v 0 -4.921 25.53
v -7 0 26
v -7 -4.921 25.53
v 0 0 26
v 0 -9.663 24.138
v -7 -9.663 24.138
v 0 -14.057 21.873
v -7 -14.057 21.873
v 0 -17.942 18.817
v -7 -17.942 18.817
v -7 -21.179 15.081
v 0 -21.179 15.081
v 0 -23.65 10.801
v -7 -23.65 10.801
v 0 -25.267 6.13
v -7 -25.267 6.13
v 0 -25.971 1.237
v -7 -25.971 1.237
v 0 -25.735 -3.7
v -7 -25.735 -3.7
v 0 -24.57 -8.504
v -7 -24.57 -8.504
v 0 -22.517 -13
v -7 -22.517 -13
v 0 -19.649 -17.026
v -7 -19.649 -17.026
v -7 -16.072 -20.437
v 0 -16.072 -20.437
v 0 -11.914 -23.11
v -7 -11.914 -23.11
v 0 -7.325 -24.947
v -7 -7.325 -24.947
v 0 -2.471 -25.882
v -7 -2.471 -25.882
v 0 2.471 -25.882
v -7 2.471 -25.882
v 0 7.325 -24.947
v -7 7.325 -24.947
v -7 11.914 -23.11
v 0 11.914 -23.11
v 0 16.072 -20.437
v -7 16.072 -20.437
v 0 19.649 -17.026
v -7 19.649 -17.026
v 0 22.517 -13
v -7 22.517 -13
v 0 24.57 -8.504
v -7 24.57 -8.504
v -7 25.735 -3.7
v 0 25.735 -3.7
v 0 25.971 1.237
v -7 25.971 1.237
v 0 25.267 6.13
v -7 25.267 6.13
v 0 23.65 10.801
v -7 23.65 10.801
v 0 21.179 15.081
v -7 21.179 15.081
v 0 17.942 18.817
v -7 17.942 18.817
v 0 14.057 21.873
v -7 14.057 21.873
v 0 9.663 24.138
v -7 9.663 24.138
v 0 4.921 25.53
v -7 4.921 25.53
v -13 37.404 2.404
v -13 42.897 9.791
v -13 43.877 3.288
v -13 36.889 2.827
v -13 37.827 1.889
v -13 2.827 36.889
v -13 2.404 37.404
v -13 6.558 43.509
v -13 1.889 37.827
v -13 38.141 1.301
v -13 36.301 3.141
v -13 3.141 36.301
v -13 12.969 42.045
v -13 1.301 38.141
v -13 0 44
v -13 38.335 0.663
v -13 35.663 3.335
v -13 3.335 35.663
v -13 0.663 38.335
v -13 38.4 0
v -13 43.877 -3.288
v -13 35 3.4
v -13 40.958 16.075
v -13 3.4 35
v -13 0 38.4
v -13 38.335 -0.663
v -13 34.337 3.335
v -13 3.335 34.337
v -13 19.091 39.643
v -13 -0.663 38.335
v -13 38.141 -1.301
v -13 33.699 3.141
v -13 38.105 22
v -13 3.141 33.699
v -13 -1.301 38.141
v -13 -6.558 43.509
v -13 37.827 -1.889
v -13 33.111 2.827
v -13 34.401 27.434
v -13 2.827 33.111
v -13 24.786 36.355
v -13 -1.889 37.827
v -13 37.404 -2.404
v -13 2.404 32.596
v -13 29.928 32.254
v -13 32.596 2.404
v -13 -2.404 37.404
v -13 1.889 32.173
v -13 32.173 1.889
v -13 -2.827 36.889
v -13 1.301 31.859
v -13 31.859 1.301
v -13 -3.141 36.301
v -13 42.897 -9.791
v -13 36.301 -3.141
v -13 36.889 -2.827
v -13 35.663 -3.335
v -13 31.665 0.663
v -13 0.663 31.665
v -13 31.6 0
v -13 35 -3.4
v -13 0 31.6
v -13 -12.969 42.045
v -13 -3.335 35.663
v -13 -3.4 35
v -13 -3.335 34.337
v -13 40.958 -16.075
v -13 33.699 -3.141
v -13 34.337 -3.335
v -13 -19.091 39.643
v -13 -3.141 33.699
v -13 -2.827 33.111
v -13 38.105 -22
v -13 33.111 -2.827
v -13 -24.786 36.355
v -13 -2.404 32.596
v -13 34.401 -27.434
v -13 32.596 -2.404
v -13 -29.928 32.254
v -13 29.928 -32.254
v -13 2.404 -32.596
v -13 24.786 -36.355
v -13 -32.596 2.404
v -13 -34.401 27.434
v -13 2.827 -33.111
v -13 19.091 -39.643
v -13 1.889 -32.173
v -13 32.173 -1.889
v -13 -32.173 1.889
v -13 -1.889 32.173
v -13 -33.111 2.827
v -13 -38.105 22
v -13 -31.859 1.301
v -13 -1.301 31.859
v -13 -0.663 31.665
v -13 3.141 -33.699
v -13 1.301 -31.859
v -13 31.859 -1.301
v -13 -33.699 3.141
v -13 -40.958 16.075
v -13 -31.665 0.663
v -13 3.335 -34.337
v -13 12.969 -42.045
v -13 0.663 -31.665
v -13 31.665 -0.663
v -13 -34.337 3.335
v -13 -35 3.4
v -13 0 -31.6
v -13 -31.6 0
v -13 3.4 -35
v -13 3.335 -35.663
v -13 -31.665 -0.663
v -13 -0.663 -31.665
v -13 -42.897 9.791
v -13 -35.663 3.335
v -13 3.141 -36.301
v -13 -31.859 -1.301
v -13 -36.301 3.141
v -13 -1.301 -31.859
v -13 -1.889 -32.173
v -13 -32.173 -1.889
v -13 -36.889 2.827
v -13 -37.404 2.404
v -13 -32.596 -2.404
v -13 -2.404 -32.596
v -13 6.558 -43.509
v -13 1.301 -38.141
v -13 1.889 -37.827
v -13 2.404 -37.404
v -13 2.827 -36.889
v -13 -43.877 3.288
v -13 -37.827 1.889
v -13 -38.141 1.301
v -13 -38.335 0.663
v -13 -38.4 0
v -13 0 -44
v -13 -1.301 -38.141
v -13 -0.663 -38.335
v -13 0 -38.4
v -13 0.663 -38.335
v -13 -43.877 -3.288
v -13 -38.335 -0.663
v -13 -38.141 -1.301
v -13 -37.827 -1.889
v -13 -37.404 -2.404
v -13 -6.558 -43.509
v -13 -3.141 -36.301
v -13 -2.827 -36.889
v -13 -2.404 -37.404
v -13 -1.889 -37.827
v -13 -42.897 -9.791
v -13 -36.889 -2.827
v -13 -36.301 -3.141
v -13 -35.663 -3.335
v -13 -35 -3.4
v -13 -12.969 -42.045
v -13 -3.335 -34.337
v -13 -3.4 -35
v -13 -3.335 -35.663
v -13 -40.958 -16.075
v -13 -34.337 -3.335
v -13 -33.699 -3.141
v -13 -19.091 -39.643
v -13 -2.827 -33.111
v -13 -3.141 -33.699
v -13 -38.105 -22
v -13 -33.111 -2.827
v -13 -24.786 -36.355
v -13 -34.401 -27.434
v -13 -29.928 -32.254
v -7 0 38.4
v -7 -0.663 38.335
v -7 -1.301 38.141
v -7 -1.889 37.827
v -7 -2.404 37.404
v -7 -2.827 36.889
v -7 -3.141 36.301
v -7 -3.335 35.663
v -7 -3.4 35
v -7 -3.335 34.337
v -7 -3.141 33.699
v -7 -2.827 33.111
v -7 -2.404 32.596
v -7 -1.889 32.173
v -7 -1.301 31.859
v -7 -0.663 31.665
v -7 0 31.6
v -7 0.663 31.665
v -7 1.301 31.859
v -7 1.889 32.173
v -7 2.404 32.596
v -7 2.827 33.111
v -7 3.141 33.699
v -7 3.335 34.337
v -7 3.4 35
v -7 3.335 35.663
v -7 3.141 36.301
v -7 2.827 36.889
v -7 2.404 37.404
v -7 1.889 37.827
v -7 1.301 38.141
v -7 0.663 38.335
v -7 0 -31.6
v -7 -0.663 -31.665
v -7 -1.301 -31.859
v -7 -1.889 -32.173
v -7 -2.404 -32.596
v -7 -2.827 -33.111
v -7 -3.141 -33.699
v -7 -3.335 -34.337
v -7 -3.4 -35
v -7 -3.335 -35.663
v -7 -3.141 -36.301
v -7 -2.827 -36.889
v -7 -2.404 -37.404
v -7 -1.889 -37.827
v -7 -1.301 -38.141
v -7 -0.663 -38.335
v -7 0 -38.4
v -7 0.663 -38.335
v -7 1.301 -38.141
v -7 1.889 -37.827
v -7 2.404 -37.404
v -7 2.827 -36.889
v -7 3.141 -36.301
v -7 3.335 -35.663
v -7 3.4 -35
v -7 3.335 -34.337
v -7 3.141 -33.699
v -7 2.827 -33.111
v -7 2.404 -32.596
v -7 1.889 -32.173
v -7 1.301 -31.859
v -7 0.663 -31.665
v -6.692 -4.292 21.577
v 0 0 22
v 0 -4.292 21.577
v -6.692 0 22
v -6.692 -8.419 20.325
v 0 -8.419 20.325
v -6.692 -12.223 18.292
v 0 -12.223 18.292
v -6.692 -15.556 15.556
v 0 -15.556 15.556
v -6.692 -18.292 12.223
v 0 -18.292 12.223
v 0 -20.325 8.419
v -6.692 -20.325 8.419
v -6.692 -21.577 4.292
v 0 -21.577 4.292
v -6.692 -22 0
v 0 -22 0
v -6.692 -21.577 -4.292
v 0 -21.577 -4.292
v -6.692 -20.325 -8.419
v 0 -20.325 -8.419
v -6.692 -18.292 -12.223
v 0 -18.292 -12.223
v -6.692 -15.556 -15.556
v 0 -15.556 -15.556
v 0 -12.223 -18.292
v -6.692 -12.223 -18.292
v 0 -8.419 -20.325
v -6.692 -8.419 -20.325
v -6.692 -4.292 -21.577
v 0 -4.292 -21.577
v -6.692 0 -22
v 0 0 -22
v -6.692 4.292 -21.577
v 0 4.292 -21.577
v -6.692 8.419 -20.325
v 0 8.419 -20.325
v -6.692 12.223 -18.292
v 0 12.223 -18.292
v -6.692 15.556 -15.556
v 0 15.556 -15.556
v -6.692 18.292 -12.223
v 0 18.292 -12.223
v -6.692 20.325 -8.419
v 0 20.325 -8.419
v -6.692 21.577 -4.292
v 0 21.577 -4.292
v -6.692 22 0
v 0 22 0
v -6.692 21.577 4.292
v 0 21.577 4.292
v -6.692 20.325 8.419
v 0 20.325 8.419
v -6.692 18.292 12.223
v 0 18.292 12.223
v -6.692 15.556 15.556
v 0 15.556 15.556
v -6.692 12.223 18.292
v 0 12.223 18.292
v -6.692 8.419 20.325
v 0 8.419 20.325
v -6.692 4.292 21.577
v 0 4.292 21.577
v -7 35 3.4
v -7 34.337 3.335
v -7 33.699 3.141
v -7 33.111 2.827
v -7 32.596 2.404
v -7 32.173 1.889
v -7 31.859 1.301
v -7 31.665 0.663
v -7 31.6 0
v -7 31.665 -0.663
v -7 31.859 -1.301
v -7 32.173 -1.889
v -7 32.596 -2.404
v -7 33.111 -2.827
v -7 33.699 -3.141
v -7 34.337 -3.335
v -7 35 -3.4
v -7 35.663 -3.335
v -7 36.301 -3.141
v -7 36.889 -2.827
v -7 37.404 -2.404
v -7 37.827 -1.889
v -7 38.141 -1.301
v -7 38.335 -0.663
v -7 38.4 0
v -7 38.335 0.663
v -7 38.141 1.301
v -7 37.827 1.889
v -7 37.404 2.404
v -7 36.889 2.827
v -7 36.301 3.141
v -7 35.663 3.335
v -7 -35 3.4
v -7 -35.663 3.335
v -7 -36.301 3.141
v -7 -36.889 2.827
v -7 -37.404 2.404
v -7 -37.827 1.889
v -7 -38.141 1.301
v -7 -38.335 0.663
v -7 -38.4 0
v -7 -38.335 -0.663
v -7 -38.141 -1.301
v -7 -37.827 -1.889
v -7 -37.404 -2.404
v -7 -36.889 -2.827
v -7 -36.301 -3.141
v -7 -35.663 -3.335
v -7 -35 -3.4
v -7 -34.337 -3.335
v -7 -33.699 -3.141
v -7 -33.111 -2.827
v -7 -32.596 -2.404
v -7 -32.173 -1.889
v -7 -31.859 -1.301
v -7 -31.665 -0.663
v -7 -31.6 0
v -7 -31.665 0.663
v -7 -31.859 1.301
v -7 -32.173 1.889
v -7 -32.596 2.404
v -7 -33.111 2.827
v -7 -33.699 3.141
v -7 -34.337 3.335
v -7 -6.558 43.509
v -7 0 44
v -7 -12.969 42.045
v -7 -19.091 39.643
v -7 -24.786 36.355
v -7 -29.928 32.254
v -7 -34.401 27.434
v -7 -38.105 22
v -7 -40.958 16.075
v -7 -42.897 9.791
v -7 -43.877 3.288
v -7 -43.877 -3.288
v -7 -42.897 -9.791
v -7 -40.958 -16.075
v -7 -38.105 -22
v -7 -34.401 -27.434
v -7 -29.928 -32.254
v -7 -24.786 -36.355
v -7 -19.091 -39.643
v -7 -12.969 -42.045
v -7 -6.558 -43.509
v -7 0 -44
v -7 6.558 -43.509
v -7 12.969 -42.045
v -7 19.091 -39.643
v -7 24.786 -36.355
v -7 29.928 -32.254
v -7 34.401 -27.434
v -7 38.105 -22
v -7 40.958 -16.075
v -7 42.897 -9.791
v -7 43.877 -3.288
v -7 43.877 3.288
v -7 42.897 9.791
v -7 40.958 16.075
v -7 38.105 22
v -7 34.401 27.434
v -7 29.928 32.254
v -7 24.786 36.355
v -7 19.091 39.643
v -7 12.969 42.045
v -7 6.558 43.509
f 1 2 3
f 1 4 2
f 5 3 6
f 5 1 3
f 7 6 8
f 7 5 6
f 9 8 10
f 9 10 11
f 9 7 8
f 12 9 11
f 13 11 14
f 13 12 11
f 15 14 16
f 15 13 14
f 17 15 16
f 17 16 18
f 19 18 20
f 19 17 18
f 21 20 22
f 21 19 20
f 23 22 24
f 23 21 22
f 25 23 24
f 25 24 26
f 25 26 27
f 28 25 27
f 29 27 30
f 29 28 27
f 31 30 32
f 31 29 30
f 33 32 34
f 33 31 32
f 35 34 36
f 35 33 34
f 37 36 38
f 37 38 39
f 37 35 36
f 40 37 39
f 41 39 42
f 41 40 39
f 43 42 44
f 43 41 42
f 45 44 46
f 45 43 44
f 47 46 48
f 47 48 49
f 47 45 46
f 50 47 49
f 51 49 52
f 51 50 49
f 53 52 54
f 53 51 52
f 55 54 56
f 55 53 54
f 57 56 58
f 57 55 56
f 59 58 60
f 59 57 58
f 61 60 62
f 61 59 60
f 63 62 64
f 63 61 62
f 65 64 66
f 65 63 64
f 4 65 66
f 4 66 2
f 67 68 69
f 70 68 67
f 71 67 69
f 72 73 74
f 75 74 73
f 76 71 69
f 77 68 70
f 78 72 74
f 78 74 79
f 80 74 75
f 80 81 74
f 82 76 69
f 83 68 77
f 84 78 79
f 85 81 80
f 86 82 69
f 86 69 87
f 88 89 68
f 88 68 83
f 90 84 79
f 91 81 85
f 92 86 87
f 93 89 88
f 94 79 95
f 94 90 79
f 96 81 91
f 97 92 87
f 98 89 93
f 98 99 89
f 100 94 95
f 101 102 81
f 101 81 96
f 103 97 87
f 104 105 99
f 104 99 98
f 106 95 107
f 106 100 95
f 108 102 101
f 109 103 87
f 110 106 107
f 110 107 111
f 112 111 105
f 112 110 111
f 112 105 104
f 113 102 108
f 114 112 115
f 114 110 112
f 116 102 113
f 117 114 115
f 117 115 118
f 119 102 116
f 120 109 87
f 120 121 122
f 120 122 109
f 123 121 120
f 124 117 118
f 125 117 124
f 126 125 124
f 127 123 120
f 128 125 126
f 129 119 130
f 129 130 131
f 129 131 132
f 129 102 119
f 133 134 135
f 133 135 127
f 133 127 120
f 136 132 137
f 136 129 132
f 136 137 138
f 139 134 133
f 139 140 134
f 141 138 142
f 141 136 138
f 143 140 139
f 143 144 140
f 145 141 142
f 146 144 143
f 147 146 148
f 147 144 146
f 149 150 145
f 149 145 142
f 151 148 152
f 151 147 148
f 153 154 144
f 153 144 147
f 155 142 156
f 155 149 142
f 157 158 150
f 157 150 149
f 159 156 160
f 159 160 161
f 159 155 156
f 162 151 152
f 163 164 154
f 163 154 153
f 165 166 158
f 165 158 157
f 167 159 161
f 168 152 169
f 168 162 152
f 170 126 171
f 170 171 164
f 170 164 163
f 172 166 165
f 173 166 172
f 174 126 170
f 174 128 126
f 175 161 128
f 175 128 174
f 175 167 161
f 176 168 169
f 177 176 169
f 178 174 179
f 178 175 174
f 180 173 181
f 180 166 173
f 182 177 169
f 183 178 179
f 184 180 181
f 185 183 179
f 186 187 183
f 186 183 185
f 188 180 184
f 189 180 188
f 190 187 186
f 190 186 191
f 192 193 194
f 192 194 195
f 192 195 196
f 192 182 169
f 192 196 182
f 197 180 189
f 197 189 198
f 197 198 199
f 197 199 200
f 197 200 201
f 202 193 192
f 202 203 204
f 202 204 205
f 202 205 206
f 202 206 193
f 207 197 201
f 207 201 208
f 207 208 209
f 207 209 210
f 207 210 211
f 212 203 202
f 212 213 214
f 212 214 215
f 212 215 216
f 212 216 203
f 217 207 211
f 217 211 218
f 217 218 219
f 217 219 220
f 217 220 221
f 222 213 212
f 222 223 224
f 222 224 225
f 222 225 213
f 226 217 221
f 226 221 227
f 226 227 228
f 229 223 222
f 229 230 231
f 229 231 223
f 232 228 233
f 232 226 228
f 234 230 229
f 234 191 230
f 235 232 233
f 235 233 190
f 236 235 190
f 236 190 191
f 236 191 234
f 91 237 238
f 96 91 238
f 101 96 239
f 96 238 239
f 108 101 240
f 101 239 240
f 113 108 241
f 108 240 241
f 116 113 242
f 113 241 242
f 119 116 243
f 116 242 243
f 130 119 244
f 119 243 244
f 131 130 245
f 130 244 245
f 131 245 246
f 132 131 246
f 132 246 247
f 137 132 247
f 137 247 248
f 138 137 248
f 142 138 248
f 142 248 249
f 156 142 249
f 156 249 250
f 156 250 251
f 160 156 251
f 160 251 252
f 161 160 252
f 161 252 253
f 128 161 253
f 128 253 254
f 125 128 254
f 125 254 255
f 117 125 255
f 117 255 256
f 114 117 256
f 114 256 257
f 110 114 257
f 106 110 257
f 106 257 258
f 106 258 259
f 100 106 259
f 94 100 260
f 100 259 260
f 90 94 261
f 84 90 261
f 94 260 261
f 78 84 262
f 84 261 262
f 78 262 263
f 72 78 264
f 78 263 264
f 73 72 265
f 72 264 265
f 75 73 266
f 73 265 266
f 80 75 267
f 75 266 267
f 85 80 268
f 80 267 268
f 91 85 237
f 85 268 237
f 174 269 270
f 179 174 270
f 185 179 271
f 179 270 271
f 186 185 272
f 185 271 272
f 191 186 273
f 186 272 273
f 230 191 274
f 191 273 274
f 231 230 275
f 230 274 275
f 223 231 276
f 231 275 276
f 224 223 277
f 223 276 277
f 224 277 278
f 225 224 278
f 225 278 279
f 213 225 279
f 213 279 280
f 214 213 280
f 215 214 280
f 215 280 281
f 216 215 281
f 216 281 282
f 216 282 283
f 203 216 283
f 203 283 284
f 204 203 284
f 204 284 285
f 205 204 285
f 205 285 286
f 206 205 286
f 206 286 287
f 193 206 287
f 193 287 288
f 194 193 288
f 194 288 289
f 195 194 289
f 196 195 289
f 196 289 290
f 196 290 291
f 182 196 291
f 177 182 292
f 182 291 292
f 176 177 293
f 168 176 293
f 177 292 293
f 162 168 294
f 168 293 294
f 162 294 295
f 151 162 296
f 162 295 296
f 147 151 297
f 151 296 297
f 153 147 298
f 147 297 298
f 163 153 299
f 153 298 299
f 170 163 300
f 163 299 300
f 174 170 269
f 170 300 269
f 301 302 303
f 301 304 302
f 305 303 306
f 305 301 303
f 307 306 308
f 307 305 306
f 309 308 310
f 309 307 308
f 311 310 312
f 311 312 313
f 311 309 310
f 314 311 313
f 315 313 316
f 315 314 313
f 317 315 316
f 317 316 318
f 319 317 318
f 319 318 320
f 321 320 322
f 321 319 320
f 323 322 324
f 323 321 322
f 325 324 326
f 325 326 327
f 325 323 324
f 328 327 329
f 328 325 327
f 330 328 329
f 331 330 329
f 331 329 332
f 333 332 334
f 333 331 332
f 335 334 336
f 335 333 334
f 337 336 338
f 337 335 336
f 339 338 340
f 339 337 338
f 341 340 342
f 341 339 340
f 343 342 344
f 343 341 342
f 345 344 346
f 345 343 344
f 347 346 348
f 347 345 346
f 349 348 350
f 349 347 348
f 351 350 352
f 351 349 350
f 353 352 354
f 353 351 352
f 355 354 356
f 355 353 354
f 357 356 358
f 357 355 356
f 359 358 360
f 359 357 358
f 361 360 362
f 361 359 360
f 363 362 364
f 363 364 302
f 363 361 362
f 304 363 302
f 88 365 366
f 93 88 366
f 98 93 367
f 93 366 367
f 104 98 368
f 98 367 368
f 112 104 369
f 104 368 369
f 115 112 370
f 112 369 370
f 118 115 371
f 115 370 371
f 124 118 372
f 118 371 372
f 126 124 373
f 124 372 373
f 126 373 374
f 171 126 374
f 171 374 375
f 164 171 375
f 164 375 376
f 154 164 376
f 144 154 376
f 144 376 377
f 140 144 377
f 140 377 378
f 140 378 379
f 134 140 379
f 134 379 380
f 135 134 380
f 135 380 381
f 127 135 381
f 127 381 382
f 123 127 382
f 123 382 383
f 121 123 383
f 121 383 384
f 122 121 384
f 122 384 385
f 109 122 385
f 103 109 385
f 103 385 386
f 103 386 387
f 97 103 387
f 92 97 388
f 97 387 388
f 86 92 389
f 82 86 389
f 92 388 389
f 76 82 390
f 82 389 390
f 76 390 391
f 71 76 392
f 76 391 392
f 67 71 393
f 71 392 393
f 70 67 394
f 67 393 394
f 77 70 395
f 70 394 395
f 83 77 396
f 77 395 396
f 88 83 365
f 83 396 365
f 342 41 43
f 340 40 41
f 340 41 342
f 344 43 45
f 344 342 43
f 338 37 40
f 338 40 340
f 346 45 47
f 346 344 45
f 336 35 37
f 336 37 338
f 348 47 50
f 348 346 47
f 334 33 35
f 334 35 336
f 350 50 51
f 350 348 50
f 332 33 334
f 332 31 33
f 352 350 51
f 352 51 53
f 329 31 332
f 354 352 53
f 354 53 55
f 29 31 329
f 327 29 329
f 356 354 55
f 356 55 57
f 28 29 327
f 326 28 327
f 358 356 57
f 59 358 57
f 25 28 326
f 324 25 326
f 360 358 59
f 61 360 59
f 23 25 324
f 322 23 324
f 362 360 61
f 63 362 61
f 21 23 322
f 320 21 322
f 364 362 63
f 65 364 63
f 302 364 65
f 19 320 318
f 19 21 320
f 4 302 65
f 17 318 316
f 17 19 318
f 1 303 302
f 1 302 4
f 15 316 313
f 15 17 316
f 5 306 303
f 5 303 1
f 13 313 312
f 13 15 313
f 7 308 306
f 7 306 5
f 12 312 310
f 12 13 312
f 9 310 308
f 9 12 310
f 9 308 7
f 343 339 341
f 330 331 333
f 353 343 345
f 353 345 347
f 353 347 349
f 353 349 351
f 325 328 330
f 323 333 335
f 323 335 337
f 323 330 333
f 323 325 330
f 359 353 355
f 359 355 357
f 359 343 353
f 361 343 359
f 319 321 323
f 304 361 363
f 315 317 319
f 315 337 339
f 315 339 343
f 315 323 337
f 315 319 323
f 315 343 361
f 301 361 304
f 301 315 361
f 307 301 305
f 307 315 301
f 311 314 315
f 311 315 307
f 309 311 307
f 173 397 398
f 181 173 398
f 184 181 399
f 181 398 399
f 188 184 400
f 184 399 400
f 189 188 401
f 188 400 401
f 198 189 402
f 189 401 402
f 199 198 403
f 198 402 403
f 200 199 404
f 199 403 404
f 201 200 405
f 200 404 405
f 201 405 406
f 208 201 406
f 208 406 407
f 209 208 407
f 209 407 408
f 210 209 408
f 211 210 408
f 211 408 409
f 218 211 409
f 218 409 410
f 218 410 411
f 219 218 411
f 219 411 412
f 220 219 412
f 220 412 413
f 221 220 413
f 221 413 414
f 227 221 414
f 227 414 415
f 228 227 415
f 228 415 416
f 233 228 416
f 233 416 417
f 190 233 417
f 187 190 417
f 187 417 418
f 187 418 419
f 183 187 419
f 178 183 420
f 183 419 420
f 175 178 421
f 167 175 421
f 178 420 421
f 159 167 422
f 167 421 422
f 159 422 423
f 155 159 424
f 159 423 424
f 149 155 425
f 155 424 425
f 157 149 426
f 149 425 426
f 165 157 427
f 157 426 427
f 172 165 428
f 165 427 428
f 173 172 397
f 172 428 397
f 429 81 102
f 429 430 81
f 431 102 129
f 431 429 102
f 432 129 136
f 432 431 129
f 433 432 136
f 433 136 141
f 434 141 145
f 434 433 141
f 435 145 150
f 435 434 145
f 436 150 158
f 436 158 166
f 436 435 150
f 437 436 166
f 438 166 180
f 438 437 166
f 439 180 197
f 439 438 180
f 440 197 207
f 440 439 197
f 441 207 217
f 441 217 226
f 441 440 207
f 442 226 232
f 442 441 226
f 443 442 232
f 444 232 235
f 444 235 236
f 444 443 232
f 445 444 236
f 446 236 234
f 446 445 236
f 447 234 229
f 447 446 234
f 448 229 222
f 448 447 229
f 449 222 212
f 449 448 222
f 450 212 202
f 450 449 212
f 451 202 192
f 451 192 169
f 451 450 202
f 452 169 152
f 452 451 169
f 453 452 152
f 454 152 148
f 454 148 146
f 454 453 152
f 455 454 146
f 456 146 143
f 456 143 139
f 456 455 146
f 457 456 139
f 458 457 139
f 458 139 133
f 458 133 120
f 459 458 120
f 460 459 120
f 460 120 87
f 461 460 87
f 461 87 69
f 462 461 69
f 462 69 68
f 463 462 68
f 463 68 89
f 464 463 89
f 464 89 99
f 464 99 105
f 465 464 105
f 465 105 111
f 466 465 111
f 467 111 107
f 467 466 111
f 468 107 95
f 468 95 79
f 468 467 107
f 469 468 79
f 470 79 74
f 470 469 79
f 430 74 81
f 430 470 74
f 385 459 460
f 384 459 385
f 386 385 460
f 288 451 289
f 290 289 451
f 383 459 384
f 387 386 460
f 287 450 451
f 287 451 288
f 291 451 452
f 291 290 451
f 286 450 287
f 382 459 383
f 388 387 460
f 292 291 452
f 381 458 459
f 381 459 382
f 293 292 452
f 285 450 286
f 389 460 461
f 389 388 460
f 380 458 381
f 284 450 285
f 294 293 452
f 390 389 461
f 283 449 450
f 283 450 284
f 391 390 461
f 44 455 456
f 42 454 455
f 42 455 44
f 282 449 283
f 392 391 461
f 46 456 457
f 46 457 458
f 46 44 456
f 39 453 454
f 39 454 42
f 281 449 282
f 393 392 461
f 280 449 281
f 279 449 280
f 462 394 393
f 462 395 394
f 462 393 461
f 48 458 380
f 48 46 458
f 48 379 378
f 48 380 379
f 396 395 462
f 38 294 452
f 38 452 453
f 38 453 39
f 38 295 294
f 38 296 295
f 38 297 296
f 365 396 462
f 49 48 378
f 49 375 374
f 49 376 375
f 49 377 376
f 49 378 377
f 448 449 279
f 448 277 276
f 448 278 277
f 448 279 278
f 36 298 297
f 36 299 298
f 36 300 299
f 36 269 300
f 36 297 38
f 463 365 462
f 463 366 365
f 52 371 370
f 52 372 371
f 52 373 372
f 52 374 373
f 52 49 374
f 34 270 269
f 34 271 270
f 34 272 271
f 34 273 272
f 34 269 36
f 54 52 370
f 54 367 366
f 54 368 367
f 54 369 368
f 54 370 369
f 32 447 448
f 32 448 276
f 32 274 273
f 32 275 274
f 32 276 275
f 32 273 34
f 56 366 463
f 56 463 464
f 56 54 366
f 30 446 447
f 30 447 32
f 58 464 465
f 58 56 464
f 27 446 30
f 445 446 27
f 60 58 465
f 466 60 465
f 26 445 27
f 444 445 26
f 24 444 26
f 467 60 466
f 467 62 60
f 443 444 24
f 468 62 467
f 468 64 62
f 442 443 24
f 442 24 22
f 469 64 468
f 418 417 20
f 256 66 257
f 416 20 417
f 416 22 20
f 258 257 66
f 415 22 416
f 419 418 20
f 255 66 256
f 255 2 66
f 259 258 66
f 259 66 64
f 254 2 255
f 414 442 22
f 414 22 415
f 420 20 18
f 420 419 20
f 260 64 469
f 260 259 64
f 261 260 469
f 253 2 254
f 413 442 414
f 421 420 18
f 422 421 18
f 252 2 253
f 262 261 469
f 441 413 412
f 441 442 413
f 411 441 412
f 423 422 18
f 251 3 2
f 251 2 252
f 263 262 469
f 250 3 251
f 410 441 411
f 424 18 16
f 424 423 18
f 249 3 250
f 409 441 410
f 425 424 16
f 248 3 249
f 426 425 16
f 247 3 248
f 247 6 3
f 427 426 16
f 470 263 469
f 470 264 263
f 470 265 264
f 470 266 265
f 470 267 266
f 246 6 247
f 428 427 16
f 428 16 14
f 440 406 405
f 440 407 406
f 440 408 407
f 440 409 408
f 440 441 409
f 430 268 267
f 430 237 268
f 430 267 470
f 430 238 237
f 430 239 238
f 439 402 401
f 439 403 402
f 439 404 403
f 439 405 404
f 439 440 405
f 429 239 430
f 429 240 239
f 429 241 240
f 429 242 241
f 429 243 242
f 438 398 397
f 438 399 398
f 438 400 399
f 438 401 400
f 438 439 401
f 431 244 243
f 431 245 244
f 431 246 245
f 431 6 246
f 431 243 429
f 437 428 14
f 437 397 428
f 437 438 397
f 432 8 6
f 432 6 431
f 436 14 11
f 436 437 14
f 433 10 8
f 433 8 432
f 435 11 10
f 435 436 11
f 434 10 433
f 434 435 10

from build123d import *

# Parameters (mm, degrees)
M8_TAPPED_HOLE1_D     = 6.8
M8_TAPPED_HOLE1_DEPTH = 16
M8_TAPPED_HOLE1_TIP   = 2.042926105


with BuildPart() as part:
    # Sketch1 → Revolve1 (revolve)
    with BuildSketch(Plane.XY, mode=Mode.PRIVATE) as revolve1_sk:
        Polygon((-13, 0), (-13, 44), (-7, 44), (-7, 26), (0, 26), (0, 22), (-6.692307692, 22), (-6.692307692, 0), align=None)
    revolve(revolve1_sk.sketch.rotate(Axis((-37.153846154, 0, 0), (1, 0, 0)), 90), axis=Axis((-37.153846154, 0, 0), (1, 0, 0)))

    # M8 Tapped Hole1
    with Locations(Plane(origin=(-13, 0, -35), x_dir=(0, 0, -1), z_dir=(-1, 0, 0))):
        with Locations((0, 0), (-35, 35), (-70, 0), (-35, -35)):
            Hole(M8_TAPPED_HOLE1_D / 2, depth=M8_TAPPED_HOLE1_DEPTH)
            with Locations((0, 0, -(M8_TAPPED_HOLE1_DEPTH + M8_TAPPED_HOLE1_TIP / 2))):  # 118° drill point
                Cone(0, M8_TAPPED_HOLE1_D / 2, M8_TAPPED_HOLE1_TIP, mode=Mode.SUBTRACT)


solid = part.part
